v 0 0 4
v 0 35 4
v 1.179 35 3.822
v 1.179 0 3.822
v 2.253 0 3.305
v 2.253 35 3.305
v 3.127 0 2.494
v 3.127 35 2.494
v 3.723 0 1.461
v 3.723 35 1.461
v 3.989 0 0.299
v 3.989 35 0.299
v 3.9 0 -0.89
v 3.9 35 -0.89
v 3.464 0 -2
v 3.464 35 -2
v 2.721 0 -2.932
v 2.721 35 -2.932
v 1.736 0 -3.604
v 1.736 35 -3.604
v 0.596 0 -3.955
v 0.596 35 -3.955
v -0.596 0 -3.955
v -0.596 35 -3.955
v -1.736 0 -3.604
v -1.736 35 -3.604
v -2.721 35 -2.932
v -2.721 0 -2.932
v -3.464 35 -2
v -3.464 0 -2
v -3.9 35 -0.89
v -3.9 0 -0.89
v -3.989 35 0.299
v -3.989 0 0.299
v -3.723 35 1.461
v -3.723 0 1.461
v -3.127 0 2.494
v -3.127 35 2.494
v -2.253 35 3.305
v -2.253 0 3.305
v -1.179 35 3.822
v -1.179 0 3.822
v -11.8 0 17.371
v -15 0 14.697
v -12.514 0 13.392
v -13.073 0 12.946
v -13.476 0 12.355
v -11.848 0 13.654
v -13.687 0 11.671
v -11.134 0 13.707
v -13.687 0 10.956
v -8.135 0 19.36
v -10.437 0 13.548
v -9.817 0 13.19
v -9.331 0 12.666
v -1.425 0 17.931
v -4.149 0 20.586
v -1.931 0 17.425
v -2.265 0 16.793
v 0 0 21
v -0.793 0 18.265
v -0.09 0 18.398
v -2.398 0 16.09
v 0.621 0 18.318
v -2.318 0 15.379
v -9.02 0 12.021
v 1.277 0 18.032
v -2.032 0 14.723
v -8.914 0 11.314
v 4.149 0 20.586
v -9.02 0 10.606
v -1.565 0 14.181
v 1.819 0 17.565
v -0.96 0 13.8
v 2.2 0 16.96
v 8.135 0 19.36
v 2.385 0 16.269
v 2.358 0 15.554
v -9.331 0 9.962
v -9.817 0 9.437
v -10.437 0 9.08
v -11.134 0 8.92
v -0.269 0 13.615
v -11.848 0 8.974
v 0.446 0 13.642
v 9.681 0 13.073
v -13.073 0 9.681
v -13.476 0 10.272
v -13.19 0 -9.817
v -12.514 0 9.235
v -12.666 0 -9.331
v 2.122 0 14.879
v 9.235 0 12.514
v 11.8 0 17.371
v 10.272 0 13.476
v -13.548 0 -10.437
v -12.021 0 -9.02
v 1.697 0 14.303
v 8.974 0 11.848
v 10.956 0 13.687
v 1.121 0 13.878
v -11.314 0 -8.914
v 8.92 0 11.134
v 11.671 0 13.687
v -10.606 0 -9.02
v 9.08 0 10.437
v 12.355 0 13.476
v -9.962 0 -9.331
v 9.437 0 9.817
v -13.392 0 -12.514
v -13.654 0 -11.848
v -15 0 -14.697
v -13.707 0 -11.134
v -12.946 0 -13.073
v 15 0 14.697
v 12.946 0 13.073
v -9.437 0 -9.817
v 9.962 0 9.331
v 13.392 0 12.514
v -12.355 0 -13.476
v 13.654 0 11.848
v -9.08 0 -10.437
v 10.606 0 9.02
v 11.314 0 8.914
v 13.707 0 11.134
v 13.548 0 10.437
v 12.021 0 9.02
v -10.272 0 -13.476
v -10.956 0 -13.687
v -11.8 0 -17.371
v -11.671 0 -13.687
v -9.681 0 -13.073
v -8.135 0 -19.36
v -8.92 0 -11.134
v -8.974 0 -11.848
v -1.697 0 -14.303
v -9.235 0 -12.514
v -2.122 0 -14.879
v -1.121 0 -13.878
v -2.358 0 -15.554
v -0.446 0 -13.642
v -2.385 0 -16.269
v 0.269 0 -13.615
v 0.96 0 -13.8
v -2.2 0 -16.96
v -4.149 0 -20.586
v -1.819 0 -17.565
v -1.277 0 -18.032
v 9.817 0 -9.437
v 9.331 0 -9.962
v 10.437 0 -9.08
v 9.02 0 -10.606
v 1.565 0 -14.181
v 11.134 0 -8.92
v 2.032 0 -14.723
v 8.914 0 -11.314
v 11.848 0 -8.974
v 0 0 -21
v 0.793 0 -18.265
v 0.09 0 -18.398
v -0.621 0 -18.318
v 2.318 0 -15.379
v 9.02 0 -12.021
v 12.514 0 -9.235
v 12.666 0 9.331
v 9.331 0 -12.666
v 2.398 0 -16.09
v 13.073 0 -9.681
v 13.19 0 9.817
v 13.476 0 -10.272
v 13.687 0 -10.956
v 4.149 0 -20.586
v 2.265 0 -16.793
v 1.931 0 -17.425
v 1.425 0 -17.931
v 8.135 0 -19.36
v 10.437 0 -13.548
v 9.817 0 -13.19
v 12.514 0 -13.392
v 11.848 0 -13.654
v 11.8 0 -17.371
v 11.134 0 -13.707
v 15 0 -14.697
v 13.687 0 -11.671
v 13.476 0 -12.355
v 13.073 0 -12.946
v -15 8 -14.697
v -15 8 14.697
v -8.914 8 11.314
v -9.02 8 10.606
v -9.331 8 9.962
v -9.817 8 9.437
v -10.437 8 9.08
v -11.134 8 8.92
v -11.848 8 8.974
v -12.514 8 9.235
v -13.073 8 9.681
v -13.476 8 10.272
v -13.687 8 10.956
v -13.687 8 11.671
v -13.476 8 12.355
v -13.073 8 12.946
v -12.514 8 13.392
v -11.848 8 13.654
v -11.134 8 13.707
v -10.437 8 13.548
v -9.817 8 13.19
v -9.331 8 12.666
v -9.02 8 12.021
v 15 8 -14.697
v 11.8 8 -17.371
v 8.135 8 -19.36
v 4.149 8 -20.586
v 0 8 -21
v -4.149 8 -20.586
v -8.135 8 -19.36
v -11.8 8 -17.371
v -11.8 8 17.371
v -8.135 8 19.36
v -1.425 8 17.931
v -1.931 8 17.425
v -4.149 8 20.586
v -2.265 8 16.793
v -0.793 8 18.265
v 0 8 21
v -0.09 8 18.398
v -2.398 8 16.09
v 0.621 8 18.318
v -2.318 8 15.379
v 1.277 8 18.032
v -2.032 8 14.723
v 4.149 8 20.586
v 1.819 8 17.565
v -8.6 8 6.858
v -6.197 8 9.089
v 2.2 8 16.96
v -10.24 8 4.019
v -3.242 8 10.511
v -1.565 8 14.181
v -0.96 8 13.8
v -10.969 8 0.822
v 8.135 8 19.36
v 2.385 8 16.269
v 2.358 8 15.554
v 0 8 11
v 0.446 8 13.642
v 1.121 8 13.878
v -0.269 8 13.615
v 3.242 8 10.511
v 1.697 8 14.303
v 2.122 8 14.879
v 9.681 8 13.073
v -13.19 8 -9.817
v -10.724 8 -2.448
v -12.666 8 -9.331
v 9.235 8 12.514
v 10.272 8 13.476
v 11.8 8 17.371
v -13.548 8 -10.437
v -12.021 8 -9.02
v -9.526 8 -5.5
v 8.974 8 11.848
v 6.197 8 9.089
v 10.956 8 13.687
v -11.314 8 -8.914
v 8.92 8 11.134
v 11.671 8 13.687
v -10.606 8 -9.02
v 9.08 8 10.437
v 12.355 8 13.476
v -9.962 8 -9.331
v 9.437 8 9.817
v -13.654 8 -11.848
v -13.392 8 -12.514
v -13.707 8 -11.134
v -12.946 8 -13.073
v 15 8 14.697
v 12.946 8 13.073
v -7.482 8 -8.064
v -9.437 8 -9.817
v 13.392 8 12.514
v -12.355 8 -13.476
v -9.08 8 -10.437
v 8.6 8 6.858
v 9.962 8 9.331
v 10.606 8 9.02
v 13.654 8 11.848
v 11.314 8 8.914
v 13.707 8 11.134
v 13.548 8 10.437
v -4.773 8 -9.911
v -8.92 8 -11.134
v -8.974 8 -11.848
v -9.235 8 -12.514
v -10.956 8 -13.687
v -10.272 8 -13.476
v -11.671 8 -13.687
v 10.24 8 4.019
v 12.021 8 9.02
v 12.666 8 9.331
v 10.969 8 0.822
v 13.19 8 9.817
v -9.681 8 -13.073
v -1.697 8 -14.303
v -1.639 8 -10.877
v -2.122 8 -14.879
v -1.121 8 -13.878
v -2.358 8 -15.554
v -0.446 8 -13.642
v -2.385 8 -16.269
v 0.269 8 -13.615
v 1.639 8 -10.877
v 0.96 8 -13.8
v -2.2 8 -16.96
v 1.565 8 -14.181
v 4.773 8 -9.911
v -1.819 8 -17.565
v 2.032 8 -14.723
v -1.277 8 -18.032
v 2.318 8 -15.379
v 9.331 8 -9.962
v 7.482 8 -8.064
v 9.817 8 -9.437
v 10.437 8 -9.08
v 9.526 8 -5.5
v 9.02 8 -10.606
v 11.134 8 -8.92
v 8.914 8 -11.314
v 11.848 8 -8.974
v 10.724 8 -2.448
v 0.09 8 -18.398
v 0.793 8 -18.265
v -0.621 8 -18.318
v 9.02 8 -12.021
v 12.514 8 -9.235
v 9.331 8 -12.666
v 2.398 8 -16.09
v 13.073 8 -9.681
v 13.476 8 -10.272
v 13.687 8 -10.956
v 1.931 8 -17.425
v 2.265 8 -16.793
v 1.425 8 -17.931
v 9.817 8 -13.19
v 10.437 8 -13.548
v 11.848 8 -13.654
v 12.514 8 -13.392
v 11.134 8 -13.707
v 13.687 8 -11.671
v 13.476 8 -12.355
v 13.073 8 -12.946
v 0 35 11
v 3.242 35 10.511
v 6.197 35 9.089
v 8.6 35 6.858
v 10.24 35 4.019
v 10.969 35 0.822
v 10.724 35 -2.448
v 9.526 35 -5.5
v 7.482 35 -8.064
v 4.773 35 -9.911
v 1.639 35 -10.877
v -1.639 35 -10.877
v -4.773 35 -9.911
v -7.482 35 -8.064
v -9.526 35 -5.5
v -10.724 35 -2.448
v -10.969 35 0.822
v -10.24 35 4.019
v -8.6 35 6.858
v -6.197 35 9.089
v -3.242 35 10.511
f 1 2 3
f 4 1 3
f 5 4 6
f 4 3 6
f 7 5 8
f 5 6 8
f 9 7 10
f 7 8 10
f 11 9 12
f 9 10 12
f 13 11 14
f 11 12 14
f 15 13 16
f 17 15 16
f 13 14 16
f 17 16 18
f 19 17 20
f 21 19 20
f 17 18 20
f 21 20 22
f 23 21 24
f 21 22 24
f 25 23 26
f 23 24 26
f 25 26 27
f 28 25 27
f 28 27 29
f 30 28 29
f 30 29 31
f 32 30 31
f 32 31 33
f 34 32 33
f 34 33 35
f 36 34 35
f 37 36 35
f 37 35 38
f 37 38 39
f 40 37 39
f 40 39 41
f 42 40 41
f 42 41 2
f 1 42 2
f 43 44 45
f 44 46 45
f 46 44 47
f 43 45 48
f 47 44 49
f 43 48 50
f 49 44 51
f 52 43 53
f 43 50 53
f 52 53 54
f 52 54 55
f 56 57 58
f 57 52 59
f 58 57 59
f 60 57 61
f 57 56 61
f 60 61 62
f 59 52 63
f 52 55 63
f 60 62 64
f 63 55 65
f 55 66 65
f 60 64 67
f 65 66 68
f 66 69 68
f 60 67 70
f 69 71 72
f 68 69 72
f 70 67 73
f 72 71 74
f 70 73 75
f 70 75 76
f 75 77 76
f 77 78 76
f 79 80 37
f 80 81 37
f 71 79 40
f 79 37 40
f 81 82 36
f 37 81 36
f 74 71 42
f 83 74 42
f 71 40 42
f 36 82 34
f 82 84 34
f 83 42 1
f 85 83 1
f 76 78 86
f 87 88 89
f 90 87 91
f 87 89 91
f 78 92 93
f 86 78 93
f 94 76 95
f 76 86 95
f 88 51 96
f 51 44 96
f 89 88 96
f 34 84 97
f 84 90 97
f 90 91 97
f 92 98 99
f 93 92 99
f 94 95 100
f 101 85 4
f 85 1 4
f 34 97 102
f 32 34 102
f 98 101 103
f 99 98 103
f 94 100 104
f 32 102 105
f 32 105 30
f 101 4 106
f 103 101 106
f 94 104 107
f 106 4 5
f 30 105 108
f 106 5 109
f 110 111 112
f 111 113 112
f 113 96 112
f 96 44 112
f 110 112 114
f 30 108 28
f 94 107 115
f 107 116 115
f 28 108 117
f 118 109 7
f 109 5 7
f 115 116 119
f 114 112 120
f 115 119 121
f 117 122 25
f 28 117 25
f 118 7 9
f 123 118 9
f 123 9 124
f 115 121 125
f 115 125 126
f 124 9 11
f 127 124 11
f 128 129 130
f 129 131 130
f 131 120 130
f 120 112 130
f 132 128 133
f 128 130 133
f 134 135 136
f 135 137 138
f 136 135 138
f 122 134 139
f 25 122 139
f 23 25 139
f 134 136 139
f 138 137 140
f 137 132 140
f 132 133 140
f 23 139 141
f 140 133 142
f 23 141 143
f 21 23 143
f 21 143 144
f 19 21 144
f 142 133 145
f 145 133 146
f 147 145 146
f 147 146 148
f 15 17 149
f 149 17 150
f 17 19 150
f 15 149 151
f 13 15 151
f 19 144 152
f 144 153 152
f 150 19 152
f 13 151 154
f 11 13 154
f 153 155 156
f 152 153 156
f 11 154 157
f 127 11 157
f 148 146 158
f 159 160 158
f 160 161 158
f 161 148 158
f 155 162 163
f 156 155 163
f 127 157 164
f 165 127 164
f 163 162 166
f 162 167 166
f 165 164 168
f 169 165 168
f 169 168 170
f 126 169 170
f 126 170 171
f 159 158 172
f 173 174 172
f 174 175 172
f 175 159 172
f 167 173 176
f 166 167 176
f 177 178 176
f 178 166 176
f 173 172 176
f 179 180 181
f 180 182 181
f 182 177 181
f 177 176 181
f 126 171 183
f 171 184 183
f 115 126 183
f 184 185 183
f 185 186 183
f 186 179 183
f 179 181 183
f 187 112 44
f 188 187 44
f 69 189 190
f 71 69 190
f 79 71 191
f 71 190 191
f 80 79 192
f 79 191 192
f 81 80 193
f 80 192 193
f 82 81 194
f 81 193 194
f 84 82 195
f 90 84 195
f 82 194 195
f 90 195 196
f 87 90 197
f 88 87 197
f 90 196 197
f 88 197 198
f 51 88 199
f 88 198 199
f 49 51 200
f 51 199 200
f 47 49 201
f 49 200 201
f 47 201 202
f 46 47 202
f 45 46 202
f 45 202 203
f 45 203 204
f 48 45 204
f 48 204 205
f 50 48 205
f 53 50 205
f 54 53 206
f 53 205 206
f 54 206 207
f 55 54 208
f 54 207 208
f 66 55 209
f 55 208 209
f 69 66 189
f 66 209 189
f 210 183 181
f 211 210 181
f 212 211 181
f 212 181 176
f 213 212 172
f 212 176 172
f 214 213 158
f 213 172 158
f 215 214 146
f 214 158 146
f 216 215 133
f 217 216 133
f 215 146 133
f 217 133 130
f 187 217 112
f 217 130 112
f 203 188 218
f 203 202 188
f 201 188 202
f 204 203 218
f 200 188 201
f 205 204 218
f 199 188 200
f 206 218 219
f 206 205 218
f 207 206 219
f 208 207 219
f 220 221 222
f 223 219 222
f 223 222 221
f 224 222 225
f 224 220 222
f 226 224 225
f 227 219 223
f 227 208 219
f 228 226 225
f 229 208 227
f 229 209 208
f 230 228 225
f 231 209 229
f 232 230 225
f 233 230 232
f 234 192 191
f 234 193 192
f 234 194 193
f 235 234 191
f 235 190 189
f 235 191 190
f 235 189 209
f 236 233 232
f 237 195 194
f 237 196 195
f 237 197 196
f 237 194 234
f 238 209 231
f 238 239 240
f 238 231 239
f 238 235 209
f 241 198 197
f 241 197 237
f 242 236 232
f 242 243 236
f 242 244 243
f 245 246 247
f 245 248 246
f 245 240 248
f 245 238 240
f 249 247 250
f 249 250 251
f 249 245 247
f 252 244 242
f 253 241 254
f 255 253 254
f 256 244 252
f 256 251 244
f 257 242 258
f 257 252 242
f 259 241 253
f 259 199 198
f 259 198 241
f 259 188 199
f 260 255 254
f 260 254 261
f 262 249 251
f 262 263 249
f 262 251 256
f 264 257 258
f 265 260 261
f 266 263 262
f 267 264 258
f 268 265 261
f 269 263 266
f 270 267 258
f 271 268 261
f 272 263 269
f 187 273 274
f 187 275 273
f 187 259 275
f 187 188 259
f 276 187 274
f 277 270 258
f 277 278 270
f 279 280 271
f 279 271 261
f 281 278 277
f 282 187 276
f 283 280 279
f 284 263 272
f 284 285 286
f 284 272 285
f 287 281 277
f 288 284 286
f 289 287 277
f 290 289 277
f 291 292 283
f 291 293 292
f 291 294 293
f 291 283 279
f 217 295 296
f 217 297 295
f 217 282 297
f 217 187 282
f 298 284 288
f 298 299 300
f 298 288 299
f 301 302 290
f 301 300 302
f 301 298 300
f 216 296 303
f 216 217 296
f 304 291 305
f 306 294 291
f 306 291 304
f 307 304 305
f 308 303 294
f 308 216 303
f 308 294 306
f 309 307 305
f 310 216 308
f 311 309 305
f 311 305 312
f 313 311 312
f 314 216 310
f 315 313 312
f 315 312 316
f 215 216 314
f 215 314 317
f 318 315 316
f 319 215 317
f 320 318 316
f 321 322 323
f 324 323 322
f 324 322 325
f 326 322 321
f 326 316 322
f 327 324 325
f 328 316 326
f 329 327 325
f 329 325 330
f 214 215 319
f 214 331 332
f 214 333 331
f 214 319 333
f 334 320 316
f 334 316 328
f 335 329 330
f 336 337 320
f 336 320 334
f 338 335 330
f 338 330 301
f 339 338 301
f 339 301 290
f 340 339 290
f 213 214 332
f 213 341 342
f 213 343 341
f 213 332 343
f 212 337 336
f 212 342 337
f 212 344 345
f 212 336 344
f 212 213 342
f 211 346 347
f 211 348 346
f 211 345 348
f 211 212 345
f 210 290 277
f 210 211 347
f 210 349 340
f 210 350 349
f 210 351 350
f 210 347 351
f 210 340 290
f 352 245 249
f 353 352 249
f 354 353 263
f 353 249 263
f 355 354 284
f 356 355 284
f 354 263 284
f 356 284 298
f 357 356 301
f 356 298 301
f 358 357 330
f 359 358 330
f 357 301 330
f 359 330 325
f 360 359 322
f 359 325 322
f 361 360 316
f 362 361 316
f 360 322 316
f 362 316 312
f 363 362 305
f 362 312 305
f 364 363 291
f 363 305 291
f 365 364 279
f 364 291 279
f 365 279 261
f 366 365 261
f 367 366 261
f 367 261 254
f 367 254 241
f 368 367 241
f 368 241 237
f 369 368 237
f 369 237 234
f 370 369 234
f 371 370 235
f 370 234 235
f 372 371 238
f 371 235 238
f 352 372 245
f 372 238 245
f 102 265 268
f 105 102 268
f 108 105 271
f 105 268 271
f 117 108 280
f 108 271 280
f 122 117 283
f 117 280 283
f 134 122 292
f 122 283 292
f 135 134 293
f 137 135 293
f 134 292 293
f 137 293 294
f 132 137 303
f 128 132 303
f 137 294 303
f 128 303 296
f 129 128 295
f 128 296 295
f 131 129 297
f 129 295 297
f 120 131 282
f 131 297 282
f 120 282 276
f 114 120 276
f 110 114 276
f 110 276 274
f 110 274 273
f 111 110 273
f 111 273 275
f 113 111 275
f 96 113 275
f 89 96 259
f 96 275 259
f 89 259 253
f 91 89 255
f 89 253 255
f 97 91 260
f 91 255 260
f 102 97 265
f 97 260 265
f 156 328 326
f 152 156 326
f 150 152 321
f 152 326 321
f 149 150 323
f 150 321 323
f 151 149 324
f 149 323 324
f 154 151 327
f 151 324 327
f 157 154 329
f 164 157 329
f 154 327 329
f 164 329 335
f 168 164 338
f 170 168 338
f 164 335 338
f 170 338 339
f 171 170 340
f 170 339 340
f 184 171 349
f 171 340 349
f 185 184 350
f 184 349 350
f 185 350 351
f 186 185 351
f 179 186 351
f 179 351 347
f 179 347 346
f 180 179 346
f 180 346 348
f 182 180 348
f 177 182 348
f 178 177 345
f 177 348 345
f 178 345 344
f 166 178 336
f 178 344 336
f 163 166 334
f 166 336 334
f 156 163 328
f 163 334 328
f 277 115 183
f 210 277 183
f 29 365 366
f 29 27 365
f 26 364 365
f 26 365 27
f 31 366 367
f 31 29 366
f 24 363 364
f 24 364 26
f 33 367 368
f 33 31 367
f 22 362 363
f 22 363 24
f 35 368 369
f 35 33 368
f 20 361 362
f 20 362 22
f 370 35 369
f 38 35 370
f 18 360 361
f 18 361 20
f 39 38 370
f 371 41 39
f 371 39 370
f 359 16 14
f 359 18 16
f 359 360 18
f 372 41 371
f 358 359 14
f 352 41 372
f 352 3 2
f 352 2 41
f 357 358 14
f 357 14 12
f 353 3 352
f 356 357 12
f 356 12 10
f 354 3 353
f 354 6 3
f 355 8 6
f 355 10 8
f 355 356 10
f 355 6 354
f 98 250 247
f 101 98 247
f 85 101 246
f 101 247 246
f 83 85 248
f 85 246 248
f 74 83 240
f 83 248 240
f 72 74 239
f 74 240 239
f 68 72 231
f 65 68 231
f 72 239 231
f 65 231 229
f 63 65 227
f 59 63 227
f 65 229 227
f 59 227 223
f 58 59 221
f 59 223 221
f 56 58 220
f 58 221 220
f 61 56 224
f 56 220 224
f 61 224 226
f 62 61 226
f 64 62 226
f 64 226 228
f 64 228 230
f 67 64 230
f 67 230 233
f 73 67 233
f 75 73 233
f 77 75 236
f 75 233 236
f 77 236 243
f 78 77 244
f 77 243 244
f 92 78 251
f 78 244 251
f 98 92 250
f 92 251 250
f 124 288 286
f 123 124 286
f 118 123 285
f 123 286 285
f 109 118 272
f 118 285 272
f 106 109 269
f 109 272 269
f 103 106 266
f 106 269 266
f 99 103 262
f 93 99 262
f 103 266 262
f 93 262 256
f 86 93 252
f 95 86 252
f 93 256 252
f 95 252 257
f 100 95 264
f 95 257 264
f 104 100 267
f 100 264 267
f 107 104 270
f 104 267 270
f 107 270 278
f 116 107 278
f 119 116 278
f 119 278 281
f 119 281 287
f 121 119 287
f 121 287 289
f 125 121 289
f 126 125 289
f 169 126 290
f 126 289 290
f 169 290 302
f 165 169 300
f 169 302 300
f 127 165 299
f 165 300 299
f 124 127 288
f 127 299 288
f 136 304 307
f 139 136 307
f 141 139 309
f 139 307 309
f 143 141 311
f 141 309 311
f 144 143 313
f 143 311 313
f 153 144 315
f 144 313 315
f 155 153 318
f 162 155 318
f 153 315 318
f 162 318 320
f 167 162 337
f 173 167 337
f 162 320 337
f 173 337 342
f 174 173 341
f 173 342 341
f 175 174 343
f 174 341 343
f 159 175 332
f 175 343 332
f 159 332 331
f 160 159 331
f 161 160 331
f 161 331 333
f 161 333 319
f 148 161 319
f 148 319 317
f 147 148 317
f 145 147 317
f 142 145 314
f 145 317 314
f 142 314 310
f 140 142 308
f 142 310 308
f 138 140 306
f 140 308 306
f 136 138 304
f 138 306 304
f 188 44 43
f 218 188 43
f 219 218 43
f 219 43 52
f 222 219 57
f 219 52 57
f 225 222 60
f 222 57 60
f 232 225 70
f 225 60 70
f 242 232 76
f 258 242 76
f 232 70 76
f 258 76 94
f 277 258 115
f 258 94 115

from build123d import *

# Parameters (mm, degrees)
EXTRUDE_1_DEPTH          = 8
SKETCH_2_R               = 4
CUT_EXTRUDE_1_DEPTH      = 28.018512172
SKETCH_3_R               = 2.4
CUT_EXTRUDE_2_DEPTH      = 8
PATTERN_CIRCULAR_2_COUNT = 8
SKETCH_4_R               = 11
EXTRUDE_2_DEPTH          = 27
SKETCH_5_R               = 4
CUT_EXTRUDE_3_DEPTH      = 44.48562981


with BuildPart() as part:
    # 草图1 → 凸台-拉伸1 (new body)
    with BuildSketch(Plane(origin=(0, 0, 0), x_dir=(1, 0, 0), z_dir=(0, 1, 0))):
        with BuildLine():
            Line((-15, 14.696938457), (-15, -14.696938457))
            ThreePointArc((-15, -14.696938457), (0, -21), (15, -14.696938457))
            Line((15, -14.696938457), (15, 14.696938457))
            ThreePointArc((15, 14.696938457), (0, 21), (-15, 14.696938457))
        make_face()
    extrude(amount=EXTRUDE_1_DEPTH)

    # 草图2 → 切除-拉伸1 (cut, through all)
    with BuildSketch(Plane(origin=(0, 8, 0), x_dir=(1, 0, 0), z_dir=(0, 1, 0))):
        with Locations(Location((0, 0, 0), (0, 0, 270))):
            Circle(SKETCH_2_R)
    extrude(amount=-CUT_EXTRUDE_1_DEPTH, mode=Mode.SUBTRACT)

    # 草图3 → 切除-拉伸2 (cut)
    with BuildSketch(Plane(origin=(0, 8, 0), x_dir=(1, 0, 0), z_dir=(0, 1, 0))):
        with Locations(Location((-11.313708499, 11.313708499, 0), (0, 0, 270))):
            Circle(SKETCH_3_R)
    cut_extrude_2 = extrude(amount=-CUT_EXTRUDE_2_DEPTH, mode=Mode.SUBTRACT)

    # 阵列(圆周)2: 切除-拉伸2 ×8 about axis, 2 skipped
    pattern_circular_2_axis = Axis((0, 8, 0), (0, 1, 0))
    add([cut_extrude_2.rotate(pattern_circular_2_axis, i * 360 / PATTERN_CIRCULAR_2_COUNT) for i in range(1, PATTERN_CIRCULAR_2_COUNT) if i not in (1, 5)], mode=Mode.SUBTRACT)

    # 草图4 → 凸台-拉伸2 (add)
    with BuildSketch(Plane(origin=(0, 8, 0), x_dir=(1, 0, 0), z_dir=(0, 1, 0))):
        with Locations(Location((0, 0, 0), (0, 0, 270))):
            Circle(SKETCH_4_R)
    extrude(amount=EXTRUDE_2_DEPTH)

    # 草图5 → 切除-拉伸3 (cut, through all)
    with BuildSketch(Plane(origin=(0, 35, 0), x_dir=(1, 0, 0), z_dir=(0, 1, 0))):
        with Locations(Location((0, 0, 0), (0, 0, 270))):
            Circle(SKETCH_5_R)
    extrude(amount=-CUT_EXTRUDE_3_DEPTH, mode=Mode.SUBTRACT)


solid = part.part
